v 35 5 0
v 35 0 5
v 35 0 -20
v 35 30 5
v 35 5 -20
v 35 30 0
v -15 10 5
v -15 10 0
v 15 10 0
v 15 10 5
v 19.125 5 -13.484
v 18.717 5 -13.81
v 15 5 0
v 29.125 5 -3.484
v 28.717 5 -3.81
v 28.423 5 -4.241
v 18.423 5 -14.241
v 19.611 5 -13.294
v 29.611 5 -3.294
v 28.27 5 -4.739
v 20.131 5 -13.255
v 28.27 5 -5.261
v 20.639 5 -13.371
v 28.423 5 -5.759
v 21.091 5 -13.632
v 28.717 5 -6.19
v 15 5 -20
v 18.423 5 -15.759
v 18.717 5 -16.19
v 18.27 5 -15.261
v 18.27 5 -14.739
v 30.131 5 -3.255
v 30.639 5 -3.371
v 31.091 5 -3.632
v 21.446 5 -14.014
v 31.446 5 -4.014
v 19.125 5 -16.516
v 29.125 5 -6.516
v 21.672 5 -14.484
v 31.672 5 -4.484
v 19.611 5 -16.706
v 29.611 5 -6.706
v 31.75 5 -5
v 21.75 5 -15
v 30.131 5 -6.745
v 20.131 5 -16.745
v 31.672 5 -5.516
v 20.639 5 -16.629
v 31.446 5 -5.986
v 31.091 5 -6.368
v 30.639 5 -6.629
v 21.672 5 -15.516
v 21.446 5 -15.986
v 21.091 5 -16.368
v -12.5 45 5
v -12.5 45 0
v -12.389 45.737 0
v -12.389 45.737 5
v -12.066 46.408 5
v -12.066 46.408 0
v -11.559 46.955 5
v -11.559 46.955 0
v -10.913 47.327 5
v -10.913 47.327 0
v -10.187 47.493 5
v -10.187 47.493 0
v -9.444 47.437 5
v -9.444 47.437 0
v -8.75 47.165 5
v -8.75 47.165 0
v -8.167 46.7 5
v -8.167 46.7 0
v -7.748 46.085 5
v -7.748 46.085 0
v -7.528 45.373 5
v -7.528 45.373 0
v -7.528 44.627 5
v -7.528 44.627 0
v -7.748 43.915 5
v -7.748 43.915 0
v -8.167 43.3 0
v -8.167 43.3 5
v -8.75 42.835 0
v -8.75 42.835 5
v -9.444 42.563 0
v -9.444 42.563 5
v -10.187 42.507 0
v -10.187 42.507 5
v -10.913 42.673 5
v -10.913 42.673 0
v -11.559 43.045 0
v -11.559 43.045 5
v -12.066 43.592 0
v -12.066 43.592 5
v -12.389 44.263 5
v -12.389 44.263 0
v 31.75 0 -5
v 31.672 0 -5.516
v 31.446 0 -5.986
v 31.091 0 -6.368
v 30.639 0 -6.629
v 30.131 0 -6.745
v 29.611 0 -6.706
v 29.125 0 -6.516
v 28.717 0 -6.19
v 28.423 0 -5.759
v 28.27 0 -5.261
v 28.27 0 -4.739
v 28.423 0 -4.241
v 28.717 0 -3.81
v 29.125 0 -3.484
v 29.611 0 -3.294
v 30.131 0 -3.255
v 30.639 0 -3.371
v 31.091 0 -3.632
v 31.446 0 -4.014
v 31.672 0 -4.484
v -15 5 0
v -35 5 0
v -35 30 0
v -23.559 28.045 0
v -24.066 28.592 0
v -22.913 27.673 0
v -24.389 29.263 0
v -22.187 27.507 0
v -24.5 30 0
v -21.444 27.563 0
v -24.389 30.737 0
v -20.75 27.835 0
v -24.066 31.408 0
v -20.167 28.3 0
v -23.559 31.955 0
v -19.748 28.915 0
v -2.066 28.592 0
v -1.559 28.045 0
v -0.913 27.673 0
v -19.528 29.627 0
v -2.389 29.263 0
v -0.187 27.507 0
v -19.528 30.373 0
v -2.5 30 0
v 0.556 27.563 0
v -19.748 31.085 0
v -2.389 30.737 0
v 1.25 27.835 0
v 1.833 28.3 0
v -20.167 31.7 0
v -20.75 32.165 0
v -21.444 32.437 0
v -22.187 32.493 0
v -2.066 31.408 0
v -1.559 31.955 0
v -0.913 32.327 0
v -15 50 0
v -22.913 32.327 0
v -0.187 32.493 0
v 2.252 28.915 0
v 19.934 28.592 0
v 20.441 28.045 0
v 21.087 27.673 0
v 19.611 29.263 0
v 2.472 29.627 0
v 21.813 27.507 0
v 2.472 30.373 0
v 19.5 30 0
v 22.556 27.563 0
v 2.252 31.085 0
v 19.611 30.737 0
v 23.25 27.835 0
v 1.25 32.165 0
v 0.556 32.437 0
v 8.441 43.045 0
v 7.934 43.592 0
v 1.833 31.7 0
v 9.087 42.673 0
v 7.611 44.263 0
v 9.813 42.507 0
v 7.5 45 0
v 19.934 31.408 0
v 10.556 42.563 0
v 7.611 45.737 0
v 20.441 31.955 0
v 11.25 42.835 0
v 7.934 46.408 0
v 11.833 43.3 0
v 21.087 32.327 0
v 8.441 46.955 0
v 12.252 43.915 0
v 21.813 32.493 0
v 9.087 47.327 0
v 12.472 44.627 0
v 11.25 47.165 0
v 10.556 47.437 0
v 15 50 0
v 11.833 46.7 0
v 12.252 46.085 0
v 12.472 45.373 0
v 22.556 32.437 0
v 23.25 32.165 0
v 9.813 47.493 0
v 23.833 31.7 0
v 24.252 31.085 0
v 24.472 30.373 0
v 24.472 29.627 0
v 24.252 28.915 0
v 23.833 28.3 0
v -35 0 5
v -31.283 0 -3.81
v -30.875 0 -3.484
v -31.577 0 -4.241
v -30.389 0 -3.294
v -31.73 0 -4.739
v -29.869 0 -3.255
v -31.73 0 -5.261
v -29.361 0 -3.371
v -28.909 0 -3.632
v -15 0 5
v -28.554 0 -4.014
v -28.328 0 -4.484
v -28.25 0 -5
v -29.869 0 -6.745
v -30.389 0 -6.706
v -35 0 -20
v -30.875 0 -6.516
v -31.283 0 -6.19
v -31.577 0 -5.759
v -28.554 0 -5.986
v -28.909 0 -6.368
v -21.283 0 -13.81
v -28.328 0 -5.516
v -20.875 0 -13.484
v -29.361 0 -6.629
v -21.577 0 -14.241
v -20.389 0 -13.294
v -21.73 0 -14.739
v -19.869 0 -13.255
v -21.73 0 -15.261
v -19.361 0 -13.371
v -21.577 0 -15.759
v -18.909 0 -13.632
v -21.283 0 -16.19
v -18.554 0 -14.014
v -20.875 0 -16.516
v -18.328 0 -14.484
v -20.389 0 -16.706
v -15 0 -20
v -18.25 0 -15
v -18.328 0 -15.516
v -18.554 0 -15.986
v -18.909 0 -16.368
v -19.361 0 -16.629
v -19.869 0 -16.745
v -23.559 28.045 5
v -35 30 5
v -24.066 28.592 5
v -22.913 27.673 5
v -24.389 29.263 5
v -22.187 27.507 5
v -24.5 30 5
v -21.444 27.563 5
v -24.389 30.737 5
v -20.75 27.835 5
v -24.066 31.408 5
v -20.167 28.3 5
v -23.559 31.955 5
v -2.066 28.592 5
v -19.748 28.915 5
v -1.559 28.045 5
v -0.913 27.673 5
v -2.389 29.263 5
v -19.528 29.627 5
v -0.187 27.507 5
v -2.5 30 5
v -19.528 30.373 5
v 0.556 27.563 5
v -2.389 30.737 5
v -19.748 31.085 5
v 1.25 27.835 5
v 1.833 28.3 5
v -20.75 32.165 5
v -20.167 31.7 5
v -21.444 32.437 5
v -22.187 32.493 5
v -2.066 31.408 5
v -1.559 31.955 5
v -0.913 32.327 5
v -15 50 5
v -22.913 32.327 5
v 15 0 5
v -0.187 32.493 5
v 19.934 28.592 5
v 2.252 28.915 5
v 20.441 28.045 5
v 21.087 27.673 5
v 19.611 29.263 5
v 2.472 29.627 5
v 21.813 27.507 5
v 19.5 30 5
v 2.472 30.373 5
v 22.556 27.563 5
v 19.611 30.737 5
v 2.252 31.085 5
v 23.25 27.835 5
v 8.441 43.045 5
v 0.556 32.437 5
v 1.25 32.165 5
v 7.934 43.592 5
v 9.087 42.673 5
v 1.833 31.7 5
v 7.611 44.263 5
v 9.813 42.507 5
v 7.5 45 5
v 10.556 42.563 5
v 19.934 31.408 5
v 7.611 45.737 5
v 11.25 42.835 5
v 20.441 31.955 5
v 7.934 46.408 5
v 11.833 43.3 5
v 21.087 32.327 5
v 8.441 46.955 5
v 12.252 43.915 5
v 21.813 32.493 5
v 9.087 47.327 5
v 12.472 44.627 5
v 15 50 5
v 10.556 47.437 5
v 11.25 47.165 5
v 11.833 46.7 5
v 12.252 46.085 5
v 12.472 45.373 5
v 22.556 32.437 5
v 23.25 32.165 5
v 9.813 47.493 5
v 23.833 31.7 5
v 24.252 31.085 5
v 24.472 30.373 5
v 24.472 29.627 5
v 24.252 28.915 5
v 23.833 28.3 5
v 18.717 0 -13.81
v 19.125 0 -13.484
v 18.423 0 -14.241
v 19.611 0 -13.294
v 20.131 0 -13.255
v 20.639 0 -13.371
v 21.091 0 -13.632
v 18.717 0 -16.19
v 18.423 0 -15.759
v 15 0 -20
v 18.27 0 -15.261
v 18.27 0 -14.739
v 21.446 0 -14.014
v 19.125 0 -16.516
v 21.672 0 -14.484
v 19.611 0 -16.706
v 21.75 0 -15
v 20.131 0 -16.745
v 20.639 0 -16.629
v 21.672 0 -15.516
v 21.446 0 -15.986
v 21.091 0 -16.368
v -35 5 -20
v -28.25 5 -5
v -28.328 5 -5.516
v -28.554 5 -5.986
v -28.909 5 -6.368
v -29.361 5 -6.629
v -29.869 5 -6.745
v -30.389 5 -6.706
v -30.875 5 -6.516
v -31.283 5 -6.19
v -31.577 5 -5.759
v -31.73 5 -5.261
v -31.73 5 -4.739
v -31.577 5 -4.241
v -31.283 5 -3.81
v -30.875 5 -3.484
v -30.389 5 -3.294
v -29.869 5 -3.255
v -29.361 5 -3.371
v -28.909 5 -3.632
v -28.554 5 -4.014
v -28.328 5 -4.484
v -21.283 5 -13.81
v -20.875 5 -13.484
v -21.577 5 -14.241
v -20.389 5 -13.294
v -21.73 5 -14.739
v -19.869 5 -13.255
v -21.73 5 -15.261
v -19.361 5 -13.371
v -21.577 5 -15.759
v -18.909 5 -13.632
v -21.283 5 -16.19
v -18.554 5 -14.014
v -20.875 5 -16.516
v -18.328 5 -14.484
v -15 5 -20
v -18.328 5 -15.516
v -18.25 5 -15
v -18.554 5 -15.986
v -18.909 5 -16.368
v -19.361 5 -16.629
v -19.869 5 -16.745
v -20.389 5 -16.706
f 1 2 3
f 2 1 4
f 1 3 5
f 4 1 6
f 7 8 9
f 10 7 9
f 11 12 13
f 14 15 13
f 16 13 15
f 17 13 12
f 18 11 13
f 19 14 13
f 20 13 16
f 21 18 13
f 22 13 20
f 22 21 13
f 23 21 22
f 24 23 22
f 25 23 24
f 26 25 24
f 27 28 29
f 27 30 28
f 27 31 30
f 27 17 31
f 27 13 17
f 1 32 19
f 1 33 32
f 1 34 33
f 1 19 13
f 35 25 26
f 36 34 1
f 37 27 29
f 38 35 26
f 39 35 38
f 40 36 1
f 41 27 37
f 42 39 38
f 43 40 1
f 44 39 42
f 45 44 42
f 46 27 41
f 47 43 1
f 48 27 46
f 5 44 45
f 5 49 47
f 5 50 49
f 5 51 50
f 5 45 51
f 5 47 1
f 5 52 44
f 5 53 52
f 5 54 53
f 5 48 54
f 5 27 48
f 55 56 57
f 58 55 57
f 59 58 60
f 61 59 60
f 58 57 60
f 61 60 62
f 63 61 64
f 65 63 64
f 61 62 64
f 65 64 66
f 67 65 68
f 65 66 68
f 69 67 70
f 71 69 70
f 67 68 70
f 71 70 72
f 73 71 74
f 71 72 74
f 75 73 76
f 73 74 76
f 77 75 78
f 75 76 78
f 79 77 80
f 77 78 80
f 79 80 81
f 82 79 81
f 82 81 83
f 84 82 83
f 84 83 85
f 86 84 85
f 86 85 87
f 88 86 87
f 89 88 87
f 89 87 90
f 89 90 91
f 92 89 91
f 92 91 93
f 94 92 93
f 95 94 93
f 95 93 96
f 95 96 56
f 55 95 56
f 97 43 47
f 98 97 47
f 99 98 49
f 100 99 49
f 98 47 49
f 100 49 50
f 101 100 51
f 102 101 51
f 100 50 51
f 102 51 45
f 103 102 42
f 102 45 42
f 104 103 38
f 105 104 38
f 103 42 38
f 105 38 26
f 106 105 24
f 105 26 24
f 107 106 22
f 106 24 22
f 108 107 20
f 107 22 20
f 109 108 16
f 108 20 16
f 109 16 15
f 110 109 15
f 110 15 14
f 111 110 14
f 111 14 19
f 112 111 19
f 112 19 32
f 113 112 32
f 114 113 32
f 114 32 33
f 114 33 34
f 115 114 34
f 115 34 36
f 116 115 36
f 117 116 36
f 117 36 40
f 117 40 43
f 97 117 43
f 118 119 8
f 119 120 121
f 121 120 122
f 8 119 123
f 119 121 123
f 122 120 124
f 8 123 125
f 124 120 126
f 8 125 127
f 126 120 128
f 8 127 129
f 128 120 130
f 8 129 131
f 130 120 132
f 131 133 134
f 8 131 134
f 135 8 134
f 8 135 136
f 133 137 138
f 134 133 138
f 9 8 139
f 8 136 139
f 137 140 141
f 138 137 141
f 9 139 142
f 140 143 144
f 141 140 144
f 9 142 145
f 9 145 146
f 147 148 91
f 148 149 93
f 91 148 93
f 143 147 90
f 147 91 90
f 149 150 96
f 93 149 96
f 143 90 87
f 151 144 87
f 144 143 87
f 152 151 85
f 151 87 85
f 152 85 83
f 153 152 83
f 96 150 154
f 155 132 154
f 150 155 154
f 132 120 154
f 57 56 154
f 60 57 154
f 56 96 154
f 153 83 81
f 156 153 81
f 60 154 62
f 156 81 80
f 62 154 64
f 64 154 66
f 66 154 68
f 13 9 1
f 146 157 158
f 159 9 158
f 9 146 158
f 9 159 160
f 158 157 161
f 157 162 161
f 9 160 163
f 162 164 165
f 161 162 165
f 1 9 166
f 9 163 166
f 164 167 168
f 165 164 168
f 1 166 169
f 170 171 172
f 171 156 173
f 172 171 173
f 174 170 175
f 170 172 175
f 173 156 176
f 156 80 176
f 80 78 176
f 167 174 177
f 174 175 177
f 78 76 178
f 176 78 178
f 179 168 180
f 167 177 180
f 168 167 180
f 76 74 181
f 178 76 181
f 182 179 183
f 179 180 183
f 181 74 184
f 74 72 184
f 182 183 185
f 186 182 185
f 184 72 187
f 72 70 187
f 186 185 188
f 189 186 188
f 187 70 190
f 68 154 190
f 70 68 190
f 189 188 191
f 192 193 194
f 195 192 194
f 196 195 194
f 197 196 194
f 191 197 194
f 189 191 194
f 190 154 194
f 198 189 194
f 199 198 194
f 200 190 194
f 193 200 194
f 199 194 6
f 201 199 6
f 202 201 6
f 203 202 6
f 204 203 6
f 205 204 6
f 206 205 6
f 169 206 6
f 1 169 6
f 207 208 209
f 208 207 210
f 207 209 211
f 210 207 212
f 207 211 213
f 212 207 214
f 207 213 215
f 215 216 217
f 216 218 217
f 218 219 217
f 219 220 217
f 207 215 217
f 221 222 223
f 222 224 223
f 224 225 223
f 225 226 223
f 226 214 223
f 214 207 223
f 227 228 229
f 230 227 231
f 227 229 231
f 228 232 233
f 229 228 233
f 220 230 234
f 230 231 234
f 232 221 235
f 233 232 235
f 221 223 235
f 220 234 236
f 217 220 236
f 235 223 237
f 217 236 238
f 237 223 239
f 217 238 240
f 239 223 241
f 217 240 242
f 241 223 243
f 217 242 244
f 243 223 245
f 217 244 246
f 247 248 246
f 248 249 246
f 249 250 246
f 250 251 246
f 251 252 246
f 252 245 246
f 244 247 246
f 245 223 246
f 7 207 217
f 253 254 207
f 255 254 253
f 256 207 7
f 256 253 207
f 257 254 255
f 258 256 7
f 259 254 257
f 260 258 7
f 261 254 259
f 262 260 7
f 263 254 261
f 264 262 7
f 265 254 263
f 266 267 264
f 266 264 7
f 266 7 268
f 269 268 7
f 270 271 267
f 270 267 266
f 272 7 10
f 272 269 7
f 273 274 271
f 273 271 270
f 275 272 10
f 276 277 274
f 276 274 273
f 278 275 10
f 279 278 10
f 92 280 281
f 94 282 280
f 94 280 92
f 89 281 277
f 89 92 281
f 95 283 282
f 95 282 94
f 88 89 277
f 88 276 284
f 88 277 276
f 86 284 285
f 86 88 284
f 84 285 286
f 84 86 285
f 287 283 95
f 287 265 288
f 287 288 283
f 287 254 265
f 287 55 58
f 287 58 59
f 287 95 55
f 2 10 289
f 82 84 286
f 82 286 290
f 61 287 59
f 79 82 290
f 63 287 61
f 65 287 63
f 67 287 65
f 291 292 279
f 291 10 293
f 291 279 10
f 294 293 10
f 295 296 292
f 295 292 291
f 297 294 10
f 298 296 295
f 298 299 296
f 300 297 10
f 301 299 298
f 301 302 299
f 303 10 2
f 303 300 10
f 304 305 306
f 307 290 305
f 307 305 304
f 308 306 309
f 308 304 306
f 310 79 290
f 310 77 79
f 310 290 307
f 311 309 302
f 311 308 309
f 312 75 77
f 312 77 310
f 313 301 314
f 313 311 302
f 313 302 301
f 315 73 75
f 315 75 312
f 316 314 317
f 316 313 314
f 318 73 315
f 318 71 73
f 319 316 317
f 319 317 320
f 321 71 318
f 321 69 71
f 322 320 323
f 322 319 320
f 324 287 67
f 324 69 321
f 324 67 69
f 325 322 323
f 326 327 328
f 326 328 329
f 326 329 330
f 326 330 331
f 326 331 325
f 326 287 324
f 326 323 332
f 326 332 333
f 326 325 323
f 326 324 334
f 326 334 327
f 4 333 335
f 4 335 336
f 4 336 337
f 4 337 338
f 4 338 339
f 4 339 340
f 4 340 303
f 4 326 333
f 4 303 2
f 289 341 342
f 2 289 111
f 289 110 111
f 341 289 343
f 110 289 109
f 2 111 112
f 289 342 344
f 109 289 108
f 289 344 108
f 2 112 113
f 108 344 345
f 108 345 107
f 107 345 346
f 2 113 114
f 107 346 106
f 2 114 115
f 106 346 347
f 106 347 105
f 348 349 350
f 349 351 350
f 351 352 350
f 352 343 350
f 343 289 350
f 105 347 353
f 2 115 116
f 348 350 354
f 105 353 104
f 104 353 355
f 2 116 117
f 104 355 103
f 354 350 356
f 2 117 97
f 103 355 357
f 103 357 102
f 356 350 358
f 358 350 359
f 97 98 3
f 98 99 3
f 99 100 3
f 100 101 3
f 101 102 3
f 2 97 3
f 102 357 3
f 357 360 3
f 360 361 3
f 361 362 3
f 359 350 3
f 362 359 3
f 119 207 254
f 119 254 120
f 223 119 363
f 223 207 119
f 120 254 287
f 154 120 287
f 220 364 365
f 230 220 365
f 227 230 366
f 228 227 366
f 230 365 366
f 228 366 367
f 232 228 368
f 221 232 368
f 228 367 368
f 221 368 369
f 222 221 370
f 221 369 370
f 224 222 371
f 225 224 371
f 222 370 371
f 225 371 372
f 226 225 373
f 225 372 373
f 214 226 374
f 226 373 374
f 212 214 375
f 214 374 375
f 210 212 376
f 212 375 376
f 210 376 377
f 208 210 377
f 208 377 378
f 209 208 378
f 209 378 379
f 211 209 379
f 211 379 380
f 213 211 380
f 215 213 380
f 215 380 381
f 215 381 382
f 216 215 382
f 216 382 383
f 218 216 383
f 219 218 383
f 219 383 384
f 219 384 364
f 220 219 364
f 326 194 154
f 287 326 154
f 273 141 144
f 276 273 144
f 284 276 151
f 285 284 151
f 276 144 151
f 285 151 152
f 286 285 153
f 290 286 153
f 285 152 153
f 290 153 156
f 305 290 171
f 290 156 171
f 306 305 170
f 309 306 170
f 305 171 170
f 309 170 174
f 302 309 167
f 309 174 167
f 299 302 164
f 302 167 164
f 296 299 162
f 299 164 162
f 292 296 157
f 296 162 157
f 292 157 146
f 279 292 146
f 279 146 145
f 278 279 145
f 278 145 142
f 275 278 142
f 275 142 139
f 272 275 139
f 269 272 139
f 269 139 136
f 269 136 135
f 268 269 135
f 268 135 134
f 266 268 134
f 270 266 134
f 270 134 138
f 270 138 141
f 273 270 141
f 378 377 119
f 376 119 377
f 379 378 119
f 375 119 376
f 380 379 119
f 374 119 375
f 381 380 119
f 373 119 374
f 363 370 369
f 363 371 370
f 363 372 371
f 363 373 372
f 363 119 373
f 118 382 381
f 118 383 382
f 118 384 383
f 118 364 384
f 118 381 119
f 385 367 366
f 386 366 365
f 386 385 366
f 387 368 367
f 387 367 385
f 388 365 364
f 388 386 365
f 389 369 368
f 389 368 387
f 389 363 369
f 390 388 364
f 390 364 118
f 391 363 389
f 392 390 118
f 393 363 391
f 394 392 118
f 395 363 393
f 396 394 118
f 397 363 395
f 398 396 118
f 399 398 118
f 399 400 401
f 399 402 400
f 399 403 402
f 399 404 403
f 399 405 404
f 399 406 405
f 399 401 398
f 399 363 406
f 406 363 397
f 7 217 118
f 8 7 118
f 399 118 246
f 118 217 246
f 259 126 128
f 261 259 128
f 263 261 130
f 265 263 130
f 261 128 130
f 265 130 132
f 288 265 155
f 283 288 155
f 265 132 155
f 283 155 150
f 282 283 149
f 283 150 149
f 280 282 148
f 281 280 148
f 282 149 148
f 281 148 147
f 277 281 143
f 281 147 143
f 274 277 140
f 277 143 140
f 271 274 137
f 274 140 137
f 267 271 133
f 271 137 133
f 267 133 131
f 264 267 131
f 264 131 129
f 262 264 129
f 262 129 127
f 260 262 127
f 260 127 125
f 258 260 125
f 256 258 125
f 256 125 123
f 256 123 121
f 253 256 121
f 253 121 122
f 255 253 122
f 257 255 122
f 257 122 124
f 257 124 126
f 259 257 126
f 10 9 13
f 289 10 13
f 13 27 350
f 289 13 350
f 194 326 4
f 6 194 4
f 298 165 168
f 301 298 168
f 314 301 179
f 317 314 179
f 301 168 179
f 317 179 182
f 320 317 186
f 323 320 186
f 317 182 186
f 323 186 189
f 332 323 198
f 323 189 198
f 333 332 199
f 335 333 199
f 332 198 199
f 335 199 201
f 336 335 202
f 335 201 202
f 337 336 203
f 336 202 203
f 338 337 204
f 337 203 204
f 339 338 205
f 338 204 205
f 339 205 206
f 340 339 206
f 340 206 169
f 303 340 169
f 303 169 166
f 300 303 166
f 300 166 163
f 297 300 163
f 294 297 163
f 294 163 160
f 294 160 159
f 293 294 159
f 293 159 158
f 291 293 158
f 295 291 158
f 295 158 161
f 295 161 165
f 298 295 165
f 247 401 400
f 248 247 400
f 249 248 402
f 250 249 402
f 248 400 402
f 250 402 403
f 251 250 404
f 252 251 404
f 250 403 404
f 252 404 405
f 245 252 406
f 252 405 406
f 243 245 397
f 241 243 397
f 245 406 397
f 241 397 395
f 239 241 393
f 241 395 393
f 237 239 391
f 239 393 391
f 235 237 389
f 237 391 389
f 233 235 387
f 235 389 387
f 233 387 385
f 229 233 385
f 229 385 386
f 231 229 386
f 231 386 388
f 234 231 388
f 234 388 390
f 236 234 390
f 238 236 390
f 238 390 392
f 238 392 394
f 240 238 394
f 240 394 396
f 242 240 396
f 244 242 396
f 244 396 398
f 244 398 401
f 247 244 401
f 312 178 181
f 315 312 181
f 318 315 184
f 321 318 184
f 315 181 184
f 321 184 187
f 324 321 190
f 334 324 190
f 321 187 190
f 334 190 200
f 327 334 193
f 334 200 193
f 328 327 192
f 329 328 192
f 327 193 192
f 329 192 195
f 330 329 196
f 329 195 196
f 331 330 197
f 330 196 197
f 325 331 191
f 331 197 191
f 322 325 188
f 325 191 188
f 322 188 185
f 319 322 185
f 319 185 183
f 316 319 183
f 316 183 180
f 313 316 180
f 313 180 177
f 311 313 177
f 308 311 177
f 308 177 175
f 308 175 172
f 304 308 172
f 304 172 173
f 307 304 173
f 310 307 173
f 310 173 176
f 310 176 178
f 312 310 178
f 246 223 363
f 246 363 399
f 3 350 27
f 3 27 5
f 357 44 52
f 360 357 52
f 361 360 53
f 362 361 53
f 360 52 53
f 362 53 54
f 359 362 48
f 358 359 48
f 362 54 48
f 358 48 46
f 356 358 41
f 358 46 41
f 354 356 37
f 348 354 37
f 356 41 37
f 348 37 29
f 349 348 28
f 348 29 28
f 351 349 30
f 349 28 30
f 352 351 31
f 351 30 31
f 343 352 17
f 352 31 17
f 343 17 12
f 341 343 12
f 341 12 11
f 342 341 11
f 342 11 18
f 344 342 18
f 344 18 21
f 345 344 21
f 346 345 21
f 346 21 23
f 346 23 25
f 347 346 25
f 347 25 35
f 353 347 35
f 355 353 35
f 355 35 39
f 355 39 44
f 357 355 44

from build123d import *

# Parameters (mm, degrees)
EXTRUDE_1_DEPTH          = 5
SKETCH_3_W               = 20
SKETCH_3_H               = 20
EXTRUDE_2_DEPTH          = 5
SKETCH_4_R               = 1.75
CUT_EXTRUDE_1_DEPTH      = 6
CUT_EXTRUDE_2_DEPTH      = 1
CUT_EXTRUDE_2_DEPTH_BACK = 26
SKETCH_6_R               = 2.5
CUT_EXTRUDE_3_DEPTH      = 6


with BuildPart() as part:
    # ｽｹｯﾁ1 → ﾎﾞｽ - 押し出し1 (new body)
    with BuildSketch(Plane.XY):
        Polygon((-15, 10), (15, 10), (15, 0), (35, 0), (35, 50), (-35, 50), (-35, 0), (-15, 0), align=None)
    extrude(amount=EXTRUDE_1_DEPTH)

    # ｽｹｯﾁ3 → ﾎﾞｽ - 押し出し2 (add)
    with BuildSketch(Plane(origin=(0, 0, 0), x_dir=(1, 0, 0), z_dir=(0, 1, 0))):
        with Locations((-25, 10)):
            Rectangle(SKETCH_3_W, SKETCH_3_H)
        with Locations((25, 10)):
            Rectangle(SKETCH_3_W, SKETCH_3_H)
    extrude(amount=EXTRUDE_2_DEPTH)

    # ｽｹｯﾁ4 → ｶｯﾄ - 押し出し1 (cut, through all)
    with BuildSketch(Plane(origin=(0, 5, 0), x_dir=(1, 0, 0), z_dir=(0, 1, 0))):
        with Locations((-30, 5)):
            Circle(SKETCH_4_R)
        with Locations((-20, 15)):
            Circle(SKETCH_4_R)
        with Locations((20, 15)):
            Circle(SKETCH_4_R)
        with Locations((30, 5)):
            Circle(SKETCH_4_R)
    extrude(amount=-CUT_EXTRUDE_1_DEPTH, mode=Mode.SUBTRACT)

    # ｽｹｯﾁ5 → ｶｯﾄ - 押し出し2 (cut, two sides)
    with BuildSketch(Plane.XY.offset(5)) as cut_extrude_2_sk:
        Polygon((15, 50), (35, 30), (35, 50), align=None)
        Polygon((-35, 30), (-15, 50), (-35, 50), align=None)
    extrude(amount=CUT_EXTRUDE_2_DEPTH, mode=Mode.SUBTRACT)
    extrude(cut_extrude_2_sk.sketch, amount=-CUT_EXTRUDE_2_DEPTH_BACK, mode=Mode.SUBTRACT)

    # ｽｹｯﾁ6 → ｶｯﾄ - 押し出し3 (cut, through all)
    with BuildSketch(Plane(origin=(0, 0, 0), x_dir=(-1, 0, 0), z_dir=(0, 0, -1))):
        with Locations((-22, 30)):
            Circle(SKETCH_6_R)
        with Locations((0, 30)):
            Circle(SKETCH_6_R)
        with Locations((-10, 45)):
            Circle(SKETCH_6_R)
        with Locations((10, 45)):
            Circle(SKETCH_6_R)
        with Locations((22, 30)):
            Circle(SKETCH_6_R)
    extrude(amount=-CUT_EXTRUDE_3_DEPTH, mode=Mode.SUBTRACT)


solid = part.part
